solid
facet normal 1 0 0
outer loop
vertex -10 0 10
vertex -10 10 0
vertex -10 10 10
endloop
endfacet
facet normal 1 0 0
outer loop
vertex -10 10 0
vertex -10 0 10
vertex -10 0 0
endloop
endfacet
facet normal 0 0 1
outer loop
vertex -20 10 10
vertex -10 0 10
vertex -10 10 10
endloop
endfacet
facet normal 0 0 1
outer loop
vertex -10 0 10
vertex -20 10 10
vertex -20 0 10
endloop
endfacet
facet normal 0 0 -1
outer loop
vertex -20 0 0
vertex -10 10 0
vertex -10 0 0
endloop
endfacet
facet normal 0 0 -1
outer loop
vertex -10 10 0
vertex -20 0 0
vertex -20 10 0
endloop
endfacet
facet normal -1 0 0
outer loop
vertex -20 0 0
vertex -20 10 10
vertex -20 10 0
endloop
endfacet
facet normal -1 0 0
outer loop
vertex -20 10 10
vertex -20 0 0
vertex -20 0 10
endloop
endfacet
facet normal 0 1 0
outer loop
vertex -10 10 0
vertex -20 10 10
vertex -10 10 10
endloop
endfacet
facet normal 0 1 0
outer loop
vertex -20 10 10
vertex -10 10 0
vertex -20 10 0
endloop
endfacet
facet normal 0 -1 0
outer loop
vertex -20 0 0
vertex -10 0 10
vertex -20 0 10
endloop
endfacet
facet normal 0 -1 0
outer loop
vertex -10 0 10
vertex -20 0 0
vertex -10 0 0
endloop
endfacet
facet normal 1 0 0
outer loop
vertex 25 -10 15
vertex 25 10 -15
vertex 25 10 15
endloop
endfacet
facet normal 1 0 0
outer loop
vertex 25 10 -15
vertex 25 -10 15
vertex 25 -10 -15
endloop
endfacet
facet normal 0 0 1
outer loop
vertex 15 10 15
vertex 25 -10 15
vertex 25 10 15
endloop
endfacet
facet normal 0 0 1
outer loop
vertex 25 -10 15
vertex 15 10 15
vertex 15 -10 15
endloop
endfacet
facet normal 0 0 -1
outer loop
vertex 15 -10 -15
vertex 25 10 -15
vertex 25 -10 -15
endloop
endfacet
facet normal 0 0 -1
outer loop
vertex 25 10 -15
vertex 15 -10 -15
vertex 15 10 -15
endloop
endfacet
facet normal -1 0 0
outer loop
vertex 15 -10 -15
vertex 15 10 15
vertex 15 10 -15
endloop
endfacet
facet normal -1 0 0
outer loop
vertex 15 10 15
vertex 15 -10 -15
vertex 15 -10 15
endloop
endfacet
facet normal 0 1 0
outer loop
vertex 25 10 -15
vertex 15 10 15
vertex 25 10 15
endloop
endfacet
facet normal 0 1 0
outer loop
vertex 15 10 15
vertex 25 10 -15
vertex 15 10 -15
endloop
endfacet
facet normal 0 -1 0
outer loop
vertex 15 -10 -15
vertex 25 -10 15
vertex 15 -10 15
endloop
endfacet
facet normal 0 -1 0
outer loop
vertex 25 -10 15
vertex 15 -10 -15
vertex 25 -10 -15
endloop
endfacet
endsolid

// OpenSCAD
// file: ../../lib/shapes/cube.scad
// lib/shapes/cube.scad

/**
 * Creates a cube with the specified dimensions.
 *
 * @param size Vector of 3 values for the x, y, and z dimensions of the cube.
 * @param center Boolean to center the cube at the origin.
 */
module shapeCube(size = [10, 10, 10], center = false) {
    cube(size, center);
}
// main file
// tests/shapes/test_cube.scad

use <../../lib/shapes/cube.scad>

module testCube() {
    translate([-20, 0, 0])
    shapeCube(size = [10, 10, 10]);

    translate([20, 0, 0])
    shapeCube(size = [10, 20, 30], center = true);
}

// Run tests
testCube();
